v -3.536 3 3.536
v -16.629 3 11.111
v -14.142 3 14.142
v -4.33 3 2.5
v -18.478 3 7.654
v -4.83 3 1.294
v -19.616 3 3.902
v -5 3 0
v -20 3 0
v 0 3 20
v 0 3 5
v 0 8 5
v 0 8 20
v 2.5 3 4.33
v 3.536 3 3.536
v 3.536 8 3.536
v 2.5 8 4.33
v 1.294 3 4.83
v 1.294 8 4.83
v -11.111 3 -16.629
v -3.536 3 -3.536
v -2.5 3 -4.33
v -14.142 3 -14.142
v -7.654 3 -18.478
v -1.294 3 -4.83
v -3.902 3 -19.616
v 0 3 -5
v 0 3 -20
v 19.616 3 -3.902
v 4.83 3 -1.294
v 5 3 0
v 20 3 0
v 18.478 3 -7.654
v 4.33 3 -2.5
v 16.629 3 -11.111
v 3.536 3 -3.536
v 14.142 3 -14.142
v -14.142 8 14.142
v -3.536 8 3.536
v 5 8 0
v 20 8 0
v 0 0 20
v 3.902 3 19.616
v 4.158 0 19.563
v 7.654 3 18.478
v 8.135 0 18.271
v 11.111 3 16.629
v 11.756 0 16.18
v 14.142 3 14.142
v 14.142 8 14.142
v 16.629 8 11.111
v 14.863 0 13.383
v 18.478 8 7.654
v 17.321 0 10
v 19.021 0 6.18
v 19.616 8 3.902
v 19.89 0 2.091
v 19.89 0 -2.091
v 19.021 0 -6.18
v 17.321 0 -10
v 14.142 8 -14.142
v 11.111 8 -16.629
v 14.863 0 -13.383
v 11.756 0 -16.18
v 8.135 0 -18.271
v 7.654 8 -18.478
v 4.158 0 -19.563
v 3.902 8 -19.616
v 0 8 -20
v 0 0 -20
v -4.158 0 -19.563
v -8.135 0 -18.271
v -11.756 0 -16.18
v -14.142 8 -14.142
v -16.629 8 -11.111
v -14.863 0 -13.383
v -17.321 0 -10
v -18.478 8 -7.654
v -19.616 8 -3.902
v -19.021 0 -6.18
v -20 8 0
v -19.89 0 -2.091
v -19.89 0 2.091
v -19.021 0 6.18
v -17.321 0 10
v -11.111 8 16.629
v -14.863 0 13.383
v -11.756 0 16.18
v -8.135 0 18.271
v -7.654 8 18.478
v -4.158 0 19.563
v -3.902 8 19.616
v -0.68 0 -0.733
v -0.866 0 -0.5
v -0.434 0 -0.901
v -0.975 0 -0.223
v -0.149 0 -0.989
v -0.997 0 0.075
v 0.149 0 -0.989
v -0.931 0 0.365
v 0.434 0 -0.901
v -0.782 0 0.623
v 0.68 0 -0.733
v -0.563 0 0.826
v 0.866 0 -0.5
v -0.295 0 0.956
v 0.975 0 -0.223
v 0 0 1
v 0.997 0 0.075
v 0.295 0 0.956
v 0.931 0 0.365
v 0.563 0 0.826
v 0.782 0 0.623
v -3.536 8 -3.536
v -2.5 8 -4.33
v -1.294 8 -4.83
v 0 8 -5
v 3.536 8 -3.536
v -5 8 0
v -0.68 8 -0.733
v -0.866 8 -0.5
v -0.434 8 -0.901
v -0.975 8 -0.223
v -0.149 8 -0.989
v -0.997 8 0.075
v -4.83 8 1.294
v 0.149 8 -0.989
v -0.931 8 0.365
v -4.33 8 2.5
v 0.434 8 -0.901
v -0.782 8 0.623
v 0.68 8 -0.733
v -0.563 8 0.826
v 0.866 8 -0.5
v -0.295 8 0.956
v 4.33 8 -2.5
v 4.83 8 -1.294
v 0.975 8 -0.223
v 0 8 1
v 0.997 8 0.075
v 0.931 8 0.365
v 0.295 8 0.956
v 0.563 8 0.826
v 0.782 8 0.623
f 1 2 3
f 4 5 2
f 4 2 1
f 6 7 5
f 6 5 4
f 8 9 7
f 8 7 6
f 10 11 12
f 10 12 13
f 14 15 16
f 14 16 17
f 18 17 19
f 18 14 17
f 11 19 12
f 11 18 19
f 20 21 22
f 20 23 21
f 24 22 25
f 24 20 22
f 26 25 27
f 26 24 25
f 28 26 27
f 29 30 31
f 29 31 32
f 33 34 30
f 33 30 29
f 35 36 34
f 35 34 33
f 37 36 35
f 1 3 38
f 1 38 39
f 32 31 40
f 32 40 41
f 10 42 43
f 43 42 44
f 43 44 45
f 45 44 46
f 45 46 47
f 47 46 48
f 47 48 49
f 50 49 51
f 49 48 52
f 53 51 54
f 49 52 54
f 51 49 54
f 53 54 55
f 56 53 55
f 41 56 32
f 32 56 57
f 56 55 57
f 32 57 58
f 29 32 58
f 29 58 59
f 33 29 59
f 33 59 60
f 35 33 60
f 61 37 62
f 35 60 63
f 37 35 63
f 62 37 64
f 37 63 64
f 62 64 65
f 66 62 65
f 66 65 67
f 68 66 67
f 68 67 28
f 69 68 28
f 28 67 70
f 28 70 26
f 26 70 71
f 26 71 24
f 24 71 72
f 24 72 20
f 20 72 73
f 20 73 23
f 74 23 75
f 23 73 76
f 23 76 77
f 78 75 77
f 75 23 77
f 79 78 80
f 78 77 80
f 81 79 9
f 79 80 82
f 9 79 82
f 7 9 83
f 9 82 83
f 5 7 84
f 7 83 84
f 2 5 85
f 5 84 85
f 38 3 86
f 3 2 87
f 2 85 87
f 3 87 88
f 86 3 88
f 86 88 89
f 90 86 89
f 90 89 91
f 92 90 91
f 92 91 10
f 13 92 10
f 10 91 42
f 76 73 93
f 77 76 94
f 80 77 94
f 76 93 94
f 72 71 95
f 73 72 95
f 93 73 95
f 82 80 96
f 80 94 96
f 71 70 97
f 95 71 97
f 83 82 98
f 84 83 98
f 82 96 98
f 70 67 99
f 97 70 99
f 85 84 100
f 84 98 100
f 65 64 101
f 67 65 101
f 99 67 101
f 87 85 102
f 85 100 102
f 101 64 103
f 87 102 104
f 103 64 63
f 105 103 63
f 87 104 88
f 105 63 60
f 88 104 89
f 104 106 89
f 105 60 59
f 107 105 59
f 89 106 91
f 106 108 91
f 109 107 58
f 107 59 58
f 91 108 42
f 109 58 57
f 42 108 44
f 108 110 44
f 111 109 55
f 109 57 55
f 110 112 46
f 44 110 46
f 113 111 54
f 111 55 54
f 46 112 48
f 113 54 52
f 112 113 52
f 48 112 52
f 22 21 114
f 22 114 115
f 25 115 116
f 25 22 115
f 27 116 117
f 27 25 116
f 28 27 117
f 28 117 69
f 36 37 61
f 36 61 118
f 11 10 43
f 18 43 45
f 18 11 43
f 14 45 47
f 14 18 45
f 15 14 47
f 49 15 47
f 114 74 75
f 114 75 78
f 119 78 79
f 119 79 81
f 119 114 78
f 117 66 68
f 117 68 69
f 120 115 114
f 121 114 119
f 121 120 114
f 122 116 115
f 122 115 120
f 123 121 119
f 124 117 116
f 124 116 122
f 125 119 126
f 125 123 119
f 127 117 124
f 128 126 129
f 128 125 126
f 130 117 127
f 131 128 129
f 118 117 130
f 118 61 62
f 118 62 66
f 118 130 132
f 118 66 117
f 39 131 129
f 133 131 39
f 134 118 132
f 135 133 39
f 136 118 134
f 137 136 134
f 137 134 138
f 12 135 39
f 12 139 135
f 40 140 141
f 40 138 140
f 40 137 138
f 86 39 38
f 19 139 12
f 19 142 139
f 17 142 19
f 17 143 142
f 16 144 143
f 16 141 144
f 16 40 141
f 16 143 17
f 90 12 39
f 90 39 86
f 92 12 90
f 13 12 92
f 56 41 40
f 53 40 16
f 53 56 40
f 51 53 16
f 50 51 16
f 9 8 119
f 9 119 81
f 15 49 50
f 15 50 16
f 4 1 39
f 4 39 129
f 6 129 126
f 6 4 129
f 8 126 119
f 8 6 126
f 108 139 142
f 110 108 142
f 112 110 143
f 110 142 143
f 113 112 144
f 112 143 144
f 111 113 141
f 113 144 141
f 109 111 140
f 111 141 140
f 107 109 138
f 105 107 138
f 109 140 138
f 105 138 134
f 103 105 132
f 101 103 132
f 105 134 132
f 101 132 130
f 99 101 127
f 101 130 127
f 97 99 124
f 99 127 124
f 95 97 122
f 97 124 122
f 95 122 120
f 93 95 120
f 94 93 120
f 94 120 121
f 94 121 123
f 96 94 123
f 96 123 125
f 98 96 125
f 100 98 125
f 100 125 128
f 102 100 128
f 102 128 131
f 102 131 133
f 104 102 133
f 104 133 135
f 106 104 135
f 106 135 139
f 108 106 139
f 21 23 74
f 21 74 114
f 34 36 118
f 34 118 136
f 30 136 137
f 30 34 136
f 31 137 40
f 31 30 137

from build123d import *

# Parameters (mm, degrees)
SKETCH1_R                             = 20
EXTRUDE_MECHANISM_PART_2_DEPTH        = 8
CUT_START                             = -5
CUT_MECHANSIM_PART_2_DEPTH            = 5
SKETCH3_R                             = 1
HOLE_FOR_SCREW_MECHANSIM_PART_2_DEPTH = 10


with BuildPart() as part:
    # Sketch1 → Extrude (Mechanism Part 2) (new body)
    with BuildSketch(Plane(origin=(0, 0, 0), x_dir=(1, 0, 0), z_dir=(0, 1, 0))):
        with Locations(Location((0, 0, 0), (0, 0, 270))):
            Circle(SKETCH1_R)
    extrude(amount=EXTRUDE_MECHANISM_PART_2_DEPTH)

    # Sketch2 → Cut (Mechansim Part 2) (cut)
    with BuildSketch(Plane(origin=(0, 8, 0), x_dir=(1, 0, 0), z_dir=(0, 1, 0)).offset(CUT_START)):
        with BuildLine():
            ThreePointArc((-3.535533906, 3.535533906), (-1.913417162, 4.619397663), (0, 5))
            Line((0, 5), (0, 20))
            ThreePointArc((0, 20), (-7.653668647, 18.47759065), (-14.142135624, 14.142135624))
            Line((-14.142135624, 14.142135624), (-3.535533906, 3.535533906))
        make_face()
        with BuildLine():
            ThreePointArc((-3.535533906, -3.535533906), (-4.619397663, -1.913417162), (-5, 0))
            Line((-5, 0), (-20, 0))
            ThreePointArc((-20, 0), (-18.47759065, -7.653668647), (-14.142135624, -14.142135624))
            Line((-14.142135624, -14.142135624), (-3.535533906, -3.535533906))
        make_face()
        with BuildLine():
            ThreePointArc((3.535533906, -3.535533906), (1.913417162, -4.619397663), (0, -5))
            Line((0, -5), (0, -20))
            ThreePointArc((0, -20), (7.653668647, -18.47759065), (14.142135624, -14.142135624))
            Line((14.142135624, -14.142135624), (3.535533906, -3.535533906))
        make_face()
        with BuildLine():
            ThreePointArc((3.535533906, 3.535533906), (4.619397663, 1.913417162), (5, 0))
            Line((5, 0), (20, 0))
            ThreePointArc((20, 0), (18.47759065, 7.653668647), (14.142135624, 14.142135624))
            Line((14.142135624, 14.142135624), (3.535533906, 3.535533906))
        make_face()
    extrude(amount=CUT_MECHANSIM_PART_2_DEPTH, mode=Mode.SUBTRACT)

    # Sketch3 → Hole for Screw (Mechansim Part 2) (cut)
    with BuildSketch(Plane(origin=(0, 8, 0), x_dir=(1, 0, 0), z_dir=(0, 1, 0))):
        with Locations(Location((0, 0, 0), (0, 0, 270))):
            Circle(SKETCH3_R)
    extrude(amount=-HOLE_FOR_SCREW_MECHANSIM_PART_2_DEPTH, mode=Mode.SUBTRACT)


solid = part.part
